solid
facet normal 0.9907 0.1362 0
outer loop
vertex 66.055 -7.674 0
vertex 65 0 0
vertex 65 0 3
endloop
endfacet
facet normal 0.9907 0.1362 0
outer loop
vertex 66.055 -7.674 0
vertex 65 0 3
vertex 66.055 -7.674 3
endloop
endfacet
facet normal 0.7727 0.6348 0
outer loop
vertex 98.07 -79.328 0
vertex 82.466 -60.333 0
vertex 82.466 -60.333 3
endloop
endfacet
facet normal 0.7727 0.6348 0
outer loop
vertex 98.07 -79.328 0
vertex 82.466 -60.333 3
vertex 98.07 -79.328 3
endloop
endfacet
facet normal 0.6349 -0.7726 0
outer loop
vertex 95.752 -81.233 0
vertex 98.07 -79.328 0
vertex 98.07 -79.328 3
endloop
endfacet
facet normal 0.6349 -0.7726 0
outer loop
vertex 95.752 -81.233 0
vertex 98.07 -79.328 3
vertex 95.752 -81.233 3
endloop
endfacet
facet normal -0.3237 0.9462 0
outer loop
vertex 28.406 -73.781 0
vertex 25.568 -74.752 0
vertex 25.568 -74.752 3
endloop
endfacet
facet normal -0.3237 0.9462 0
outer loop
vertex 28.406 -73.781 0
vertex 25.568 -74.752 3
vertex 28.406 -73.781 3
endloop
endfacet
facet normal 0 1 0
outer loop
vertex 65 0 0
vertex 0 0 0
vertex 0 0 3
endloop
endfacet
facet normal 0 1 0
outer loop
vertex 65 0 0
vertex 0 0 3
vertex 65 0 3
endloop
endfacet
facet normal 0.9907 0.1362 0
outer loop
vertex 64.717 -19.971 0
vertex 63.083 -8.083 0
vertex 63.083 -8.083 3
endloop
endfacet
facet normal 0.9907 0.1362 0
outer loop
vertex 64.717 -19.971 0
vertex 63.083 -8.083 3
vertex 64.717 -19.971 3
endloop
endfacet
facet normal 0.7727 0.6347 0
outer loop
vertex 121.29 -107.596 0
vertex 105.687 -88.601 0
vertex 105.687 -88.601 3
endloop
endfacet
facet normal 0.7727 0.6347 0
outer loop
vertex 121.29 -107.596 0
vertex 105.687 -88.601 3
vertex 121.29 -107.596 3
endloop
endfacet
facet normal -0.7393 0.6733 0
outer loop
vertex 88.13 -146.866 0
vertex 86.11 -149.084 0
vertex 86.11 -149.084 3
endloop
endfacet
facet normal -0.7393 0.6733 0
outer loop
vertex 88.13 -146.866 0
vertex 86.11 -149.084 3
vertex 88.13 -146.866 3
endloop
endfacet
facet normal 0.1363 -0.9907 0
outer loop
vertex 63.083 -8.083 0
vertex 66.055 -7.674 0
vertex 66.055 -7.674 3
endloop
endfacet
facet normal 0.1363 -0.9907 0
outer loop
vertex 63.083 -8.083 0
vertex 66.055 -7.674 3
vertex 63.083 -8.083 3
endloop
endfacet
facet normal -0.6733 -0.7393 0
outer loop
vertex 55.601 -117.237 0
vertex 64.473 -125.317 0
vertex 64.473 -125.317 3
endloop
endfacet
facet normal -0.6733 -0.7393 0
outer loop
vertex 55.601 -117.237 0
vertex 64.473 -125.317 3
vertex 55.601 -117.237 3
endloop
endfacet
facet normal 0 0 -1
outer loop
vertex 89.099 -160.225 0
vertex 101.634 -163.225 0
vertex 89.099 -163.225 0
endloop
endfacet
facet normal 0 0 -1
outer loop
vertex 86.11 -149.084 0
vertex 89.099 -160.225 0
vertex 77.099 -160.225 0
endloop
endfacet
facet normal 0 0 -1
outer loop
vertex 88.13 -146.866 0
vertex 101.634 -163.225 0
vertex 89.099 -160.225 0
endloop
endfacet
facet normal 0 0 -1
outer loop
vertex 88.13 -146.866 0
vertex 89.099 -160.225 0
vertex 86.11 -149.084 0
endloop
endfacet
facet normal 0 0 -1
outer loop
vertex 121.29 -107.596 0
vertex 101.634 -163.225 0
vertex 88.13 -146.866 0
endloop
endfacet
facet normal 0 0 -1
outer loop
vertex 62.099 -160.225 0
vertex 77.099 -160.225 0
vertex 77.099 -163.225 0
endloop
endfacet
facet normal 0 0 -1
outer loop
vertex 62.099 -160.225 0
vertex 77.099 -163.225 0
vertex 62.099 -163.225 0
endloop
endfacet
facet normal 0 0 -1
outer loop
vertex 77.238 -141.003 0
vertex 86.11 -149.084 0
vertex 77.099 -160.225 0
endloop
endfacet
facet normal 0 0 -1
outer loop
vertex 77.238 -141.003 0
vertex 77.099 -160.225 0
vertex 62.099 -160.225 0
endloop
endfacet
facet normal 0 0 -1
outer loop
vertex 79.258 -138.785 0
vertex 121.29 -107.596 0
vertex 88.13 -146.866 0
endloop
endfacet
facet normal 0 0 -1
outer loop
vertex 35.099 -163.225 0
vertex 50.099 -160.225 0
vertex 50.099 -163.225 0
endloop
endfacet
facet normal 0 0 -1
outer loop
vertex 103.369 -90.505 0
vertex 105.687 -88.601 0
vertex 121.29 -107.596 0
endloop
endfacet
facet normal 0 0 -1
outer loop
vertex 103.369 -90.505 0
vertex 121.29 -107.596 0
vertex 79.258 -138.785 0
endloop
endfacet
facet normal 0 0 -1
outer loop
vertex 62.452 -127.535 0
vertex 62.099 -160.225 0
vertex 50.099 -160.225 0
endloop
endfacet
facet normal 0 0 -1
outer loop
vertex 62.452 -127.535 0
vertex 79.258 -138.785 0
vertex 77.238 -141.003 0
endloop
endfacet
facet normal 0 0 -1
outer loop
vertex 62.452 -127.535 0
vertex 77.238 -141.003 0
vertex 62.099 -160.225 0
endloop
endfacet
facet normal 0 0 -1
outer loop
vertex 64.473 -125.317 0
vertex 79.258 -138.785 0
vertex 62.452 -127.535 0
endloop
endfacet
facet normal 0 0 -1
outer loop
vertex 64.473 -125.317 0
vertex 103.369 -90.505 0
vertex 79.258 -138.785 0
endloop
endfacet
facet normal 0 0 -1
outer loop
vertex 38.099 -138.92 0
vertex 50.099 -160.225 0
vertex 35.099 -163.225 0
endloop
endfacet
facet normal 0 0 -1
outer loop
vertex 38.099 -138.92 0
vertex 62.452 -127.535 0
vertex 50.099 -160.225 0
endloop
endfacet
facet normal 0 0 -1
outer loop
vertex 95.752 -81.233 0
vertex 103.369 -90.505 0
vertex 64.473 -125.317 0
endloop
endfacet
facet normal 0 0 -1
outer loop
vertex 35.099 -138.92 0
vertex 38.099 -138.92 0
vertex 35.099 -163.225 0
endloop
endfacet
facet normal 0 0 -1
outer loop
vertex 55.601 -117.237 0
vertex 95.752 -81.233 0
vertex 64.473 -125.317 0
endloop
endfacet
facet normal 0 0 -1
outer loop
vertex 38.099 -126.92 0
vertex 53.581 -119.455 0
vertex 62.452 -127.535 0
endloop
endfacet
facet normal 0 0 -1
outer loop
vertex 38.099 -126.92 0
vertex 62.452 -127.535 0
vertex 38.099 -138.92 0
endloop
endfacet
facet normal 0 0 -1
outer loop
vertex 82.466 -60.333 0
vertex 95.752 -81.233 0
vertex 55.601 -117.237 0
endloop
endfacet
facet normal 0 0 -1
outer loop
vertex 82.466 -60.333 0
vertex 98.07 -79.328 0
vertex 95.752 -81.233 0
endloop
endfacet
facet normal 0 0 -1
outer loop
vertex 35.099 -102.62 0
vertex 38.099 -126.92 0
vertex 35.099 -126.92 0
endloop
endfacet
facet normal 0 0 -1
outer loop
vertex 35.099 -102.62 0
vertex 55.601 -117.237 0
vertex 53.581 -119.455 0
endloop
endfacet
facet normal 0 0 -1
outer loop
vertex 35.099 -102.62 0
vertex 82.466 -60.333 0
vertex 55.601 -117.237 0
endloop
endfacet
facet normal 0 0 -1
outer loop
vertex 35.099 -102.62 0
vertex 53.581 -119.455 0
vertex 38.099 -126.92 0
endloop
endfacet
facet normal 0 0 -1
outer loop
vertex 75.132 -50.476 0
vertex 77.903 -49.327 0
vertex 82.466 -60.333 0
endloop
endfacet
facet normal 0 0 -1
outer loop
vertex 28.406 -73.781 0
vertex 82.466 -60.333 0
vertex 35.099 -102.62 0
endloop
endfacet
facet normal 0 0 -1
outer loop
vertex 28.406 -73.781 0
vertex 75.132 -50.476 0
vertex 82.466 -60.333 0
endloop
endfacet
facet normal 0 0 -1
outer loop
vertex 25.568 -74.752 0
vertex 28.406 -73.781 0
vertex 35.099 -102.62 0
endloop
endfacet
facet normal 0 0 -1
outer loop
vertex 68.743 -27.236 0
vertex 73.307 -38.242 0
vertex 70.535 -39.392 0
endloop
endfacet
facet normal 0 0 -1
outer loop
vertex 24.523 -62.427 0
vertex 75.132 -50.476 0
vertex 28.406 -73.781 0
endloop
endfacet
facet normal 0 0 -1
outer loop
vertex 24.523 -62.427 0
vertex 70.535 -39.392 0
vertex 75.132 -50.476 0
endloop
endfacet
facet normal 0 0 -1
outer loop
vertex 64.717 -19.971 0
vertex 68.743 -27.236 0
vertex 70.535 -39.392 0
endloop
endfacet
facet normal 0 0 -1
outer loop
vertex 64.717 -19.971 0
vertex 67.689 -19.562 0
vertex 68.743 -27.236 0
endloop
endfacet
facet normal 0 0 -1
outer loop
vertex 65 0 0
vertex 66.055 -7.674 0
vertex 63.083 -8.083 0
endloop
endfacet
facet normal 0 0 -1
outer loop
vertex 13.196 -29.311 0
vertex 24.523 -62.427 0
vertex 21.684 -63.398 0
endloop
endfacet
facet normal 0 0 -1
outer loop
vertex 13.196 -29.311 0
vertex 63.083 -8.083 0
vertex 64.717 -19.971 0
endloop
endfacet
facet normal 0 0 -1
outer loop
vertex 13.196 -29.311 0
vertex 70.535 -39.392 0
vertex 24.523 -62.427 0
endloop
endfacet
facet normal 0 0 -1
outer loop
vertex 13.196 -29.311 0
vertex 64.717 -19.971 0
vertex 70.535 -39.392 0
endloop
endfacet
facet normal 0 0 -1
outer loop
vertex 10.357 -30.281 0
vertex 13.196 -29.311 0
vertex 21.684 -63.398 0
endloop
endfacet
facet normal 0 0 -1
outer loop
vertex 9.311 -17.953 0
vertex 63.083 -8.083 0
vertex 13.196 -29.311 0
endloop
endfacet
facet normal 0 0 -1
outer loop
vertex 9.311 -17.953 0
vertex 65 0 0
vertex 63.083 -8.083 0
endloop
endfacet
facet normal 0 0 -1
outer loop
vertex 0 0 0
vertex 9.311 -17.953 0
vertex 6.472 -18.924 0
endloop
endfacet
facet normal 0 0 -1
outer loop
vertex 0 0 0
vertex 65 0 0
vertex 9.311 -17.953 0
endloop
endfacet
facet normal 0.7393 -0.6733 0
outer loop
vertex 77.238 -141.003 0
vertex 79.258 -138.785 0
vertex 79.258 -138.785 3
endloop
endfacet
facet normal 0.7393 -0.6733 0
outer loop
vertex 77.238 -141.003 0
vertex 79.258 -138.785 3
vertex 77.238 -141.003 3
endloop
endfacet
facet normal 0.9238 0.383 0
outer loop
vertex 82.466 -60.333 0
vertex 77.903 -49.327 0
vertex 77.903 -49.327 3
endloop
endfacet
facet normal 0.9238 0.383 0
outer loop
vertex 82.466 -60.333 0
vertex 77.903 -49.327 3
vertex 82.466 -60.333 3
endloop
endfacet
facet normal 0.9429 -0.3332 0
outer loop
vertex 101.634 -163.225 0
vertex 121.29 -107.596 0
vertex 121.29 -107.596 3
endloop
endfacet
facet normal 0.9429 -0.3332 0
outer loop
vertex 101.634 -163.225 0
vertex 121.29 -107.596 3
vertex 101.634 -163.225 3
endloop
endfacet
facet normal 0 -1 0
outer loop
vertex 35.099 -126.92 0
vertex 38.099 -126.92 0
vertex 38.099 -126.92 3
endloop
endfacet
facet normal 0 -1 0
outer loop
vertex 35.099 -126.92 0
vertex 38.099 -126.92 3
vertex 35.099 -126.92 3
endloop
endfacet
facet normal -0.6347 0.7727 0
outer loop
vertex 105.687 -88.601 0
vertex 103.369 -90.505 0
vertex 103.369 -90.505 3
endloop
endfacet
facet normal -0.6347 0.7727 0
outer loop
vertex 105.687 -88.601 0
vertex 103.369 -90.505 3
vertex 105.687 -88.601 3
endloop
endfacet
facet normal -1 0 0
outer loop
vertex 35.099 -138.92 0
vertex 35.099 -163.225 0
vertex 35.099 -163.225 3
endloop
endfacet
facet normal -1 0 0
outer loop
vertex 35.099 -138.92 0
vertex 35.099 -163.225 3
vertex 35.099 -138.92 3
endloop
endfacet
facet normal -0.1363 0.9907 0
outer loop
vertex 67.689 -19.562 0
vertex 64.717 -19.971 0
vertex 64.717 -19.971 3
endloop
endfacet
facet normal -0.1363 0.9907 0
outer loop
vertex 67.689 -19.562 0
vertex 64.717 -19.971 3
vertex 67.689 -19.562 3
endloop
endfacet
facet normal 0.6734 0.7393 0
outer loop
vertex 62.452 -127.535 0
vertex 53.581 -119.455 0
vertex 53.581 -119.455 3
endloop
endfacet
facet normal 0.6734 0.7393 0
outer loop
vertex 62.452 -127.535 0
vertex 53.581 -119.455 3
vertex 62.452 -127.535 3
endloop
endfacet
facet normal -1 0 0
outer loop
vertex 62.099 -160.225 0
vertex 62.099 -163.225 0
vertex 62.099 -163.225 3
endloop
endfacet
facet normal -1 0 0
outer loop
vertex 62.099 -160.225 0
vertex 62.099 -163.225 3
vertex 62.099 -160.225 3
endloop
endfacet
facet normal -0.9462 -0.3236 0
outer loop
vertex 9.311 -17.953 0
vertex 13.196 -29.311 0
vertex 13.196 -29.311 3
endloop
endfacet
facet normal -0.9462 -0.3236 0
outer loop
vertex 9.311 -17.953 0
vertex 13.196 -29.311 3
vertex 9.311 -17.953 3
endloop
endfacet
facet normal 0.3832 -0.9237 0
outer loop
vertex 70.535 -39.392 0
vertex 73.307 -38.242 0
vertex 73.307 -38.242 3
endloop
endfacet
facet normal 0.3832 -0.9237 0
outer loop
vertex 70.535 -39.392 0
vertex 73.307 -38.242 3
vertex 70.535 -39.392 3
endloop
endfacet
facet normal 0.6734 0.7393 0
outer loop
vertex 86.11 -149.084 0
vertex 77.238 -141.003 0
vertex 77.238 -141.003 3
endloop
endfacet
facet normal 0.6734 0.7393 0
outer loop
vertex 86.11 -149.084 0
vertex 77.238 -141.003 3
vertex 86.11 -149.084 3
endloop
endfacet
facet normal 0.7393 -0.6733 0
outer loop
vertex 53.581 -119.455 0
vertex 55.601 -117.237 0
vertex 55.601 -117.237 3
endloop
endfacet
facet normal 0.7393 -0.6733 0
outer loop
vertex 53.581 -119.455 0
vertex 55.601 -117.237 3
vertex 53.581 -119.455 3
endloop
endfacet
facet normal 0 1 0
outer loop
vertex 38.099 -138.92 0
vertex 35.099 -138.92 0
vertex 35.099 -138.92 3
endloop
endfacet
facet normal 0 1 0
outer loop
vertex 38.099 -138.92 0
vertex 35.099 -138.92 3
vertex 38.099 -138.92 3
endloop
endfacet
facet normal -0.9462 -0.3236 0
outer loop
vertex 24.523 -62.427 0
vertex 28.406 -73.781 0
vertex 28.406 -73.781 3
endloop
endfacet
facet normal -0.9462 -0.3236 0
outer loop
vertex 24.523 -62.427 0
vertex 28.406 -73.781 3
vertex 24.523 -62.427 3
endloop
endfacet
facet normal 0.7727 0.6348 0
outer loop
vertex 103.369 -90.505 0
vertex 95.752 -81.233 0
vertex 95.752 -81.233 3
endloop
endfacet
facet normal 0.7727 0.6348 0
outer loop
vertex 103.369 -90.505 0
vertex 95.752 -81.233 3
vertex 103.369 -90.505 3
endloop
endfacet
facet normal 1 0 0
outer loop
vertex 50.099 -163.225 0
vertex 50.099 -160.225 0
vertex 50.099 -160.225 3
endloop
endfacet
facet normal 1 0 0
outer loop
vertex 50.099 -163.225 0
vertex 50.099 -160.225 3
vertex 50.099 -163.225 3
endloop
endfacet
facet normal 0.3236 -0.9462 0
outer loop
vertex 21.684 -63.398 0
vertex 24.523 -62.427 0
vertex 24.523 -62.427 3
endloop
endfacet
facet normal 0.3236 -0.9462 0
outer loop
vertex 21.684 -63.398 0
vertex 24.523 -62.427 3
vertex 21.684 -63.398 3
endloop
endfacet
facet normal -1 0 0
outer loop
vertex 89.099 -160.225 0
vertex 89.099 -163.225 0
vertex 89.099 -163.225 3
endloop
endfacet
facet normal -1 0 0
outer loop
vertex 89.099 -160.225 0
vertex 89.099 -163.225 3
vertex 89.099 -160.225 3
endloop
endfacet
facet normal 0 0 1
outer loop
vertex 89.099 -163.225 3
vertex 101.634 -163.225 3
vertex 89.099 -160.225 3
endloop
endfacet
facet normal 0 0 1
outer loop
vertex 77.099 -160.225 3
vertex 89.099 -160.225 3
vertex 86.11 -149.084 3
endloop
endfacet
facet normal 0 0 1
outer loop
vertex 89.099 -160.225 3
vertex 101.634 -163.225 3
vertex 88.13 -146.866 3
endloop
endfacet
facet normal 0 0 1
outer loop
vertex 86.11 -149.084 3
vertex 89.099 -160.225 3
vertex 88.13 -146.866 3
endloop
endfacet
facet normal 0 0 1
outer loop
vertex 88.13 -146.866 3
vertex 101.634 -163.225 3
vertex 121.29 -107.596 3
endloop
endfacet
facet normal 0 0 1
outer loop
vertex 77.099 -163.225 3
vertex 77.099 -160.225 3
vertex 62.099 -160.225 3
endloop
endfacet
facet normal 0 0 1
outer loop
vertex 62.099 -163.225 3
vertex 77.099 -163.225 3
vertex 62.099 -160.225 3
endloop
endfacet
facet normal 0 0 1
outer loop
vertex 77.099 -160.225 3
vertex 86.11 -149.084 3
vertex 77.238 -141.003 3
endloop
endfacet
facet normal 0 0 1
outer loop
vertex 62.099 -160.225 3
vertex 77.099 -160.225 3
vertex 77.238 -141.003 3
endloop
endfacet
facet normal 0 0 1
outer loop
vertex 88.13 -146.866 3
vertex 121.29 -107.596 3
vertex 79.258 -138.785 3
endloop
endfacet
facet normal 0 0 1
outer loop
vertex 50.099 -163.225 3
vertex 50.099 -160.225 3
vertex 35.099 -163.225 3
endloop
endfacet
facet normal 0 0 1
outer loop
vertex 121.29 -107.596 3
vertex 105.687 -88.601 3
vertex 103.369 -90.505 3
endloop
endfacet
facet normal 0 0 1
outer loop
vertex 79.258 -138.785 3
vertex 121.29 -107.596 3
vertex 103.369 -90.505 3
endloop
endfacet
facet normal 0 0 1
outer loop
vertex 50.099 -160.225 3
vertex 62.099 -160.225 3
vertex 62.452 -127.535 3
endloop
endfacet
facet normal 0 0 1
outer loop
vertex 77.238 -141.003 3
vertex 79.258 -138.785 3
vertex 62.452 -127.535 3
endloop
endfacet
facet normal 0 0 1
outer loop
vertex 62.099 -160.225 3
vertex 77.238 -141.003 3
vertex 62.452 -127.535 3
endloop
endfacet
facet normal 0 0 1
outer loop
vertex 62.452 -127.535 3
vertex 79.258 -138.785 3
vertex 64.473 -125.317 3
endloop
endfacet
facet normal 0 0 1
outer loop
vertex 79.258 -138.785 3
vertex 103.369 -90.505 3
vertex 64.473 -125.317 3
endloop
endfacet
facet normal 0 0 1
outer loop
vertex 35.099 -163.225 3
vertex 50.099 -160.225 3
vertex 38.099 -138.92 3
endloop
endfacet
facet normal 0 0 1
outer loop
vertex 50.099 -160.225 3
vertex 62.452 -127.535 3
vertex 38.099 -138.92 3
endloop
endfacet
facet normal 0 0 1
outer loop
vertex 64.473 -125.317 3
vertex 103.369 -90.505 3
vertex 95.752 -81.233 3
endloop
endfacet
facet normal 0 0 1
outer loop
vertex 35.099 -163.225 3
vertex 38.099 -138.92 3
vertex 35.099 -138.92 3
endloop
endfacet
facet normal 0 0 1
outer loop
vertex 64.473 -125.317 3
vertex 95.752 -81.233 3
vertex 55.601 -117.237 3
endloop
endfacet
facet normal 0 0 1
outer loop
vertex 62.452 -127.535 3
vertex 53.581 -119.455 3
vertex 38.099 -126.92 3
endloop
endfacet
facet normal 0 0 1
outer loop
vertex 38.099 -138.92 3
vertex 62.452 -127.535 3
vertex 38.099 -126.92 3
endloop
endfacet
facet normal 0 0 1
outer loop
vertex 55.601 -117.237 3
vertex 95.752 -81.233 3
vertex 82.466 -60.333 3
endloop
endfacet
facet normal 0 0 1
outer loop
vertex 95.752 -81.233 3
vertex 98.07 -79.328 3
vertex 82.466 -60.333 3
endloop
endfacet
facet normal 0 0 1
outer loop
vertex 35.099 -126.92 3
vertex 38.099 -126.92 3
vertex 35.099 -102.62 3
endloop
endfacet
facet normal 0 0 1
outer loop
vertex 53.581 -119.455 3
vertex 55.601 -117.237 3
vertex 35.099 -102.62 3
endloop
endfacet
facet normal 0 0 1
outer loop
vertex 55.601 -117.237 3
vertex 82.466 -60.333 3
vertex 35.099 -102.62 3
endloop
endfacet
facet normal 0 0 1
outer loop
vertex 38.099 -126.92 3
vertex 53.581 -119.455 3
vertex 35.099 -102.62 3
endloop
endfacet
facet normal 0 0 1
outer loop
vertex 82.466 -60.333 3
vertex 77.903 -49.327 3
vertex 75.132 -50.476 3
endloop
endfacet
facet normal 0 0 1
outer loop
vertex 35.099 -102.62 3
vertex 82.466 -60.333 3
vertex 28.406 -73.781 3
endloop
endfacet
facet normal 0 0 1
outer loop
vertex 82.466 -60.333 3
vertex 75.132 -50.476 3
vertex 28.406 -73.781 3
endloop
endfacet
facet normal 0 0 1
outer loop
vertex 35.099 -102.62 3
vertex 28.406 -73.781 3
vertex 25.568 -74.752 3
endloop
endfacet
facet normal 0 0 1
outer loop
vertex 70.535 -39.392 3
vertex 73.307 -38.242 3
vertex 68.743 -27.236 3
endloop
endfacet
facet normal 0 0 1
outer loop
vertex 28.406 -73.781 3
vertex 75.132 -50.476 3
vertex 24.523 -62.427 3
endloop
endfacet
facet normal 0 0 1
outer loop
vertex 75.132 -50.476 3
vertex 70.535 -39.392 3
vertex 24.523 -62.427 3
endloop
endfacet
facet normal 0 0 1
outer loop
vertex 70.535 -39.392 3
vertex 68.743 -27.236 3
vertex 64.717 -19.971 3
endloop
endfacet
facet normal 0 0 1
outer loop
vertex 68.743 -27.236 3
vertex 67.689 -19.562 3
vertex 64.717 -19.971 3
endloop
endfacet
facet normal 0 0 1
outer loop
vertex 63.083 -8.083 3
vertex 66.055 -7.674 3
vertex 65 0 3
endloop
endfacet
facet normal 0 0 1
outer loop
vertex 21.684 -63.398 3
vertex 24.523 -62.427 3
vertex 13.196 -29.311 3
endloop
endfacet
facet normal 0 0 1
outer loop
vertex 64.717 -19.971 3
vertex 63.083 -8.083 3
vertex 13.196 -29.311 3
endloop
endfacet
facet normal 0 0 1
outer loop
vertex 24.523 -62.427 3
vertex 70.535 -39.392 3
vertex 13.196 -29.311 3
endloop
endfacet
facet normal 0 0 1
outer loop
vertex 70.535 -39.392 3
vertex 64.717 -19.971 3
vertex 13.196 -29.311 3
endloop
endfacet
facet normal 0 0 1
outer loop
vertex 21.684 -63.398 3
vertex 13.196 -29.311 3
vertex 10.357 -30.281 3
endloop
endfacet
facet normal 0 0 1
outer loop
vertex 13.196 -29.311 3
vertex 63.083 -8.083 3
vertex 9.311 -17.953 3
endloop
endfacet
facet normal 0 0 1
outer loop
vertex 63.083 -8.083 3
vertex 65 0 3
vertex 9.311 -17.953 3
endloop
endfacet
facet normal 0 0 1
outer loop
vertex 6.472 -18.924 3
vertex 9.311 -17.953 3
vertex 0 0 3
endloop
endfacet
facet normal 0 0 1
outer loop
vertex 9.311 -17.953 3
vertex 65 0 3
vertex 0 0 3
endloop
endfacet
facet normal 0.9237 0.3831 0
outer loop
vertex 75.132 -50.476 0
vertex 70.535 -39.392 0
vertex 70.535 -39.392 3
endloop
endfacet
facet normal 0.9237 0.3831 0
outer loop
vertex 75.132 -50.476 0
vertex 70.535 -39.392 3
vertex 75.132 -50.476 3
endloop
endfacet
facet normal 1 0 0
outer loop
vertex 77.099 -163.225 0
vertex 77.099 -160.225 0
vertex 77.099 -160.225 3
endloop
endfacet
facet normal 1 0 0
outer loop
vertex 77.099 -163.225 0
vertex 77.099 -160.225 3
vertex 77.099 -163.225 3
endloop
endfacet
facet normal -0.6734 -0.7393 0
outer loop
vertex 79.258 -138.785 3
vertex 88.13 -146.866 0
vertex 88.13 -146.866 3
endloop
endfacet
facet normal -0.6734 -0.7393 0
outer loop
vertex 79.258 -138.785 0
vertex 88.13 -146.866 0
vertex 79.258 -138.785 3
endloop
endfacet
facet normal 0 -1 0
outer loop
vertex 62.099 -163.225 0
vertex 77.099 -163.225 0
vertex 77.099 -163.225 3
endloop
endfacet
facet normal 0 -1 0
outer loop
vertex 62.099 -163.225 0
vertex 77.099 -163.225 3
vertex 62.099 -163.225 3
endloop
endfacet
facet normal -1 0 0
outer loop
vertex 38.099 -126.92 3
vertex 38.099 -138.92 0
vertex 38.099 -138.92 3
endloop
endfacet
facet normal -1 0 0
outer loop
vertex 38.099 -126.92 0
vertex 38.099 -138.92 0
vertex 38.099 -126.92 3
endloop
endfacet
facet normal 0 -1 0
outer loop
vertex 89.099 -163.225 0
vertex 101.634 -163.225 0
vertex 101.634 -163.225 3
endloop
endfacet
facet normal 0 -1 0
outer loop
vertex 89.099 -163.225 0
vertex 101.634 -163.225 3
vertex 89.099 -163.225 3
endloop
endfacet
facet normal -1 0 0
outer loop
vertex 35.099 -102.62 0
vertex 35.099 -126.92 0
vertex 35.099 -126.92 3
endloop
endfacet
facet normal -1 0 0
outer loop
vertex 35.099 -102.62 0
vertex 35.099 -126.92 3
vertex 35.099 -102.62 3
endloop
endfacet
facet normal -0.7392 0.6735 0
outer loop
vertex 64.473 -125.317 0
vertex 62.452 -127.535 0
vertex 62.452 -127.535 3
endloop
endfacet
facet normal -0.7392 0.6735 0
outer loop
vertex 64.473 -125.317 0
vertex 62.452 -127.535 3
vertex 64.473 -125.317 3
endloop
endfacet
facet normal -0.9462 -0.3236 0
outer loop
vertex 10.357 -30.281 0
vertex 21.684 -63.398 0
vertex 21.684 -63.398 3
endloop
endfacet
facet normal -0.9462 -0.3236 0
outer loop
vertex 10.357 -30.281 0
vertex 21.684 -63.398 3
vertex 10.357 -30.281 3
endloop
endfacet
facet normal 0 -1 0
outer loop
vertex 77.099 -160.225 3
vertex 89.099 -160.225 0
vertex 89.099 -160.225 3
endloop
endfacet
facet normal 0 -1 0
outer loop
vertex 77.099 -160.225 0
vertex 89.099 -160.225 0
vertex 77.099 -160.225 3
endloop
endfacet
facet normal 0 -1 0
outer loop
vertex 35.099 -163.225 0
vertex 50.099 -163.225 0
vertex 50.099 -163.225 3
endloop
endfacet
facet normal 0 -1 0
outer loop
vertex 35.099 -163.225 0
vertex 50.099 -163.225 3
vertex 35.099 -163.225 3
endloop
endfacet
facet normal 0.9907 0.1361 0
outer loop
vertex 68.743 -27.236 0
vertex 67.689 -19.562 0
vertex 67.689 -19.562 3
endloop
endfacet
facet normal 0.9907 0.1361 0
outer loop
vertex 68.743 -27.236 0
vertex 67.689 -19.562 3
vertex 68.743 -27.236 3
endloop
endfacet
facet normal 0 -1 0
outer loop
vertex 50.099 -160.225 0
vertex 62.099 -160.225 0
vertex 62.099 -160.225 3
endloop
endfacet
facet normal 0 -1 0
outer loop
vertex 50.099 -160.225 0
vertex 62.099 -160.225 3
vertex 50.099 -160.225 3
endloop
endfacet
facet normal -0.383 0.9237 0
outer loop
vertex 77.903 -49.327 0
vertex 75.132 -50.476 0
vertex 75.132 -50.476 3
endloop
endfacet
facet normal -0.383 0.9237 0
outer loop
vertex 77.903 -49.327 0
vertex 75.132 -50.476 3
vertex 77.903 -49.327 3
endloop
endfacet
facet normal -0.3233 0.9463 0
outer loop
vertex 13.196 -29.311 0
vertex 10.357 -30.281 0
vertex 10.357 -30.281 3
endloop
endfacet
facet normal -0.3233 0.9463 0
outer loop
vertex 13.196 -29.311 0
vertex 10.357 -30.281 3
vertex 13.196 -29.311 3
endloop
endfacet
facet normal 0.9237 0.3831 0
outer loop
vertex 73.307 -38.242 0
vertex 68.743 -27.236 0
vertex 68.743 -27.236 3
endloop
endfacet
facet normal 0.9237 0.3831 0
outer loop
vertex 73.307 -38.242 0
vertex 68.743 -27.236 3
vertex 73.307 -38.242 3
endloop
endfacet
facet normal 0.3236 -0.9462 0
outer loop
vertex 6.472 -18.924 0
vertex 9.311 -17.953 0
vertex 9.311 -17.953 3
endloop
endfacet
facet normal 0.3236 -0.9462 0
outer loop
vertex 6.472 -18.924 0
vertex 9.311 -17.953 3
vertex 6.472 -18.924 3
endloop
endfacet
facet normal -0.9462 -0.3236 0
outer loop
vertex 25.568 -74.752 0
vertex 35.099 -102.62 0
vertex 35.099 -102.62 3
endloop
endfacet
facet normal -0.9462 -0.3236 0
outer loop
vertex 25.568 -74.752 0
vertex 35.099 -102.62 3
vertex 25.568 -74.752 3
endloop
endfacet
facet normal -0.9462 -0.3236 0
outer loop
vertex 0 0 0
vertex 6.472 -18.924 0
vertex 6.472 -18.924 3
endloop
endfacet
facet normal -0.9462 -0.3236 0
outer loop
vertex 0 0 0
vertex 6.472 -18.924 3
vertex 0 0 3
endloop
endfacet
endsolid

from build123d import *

# Parameters (mm, degrees)
P_IDAT_VYSUNUT_M1_DEPTH = 3


with BuildPart() as part:
    # Skica1 → Přidat vysunutím1 (new body)
    with BuildSketch(Plane.XY):
        Polygon((35.098999138, -102.619674243), (25.567500119, -74.752232196), (28.406057565, -73.781360615), (24.522571242, -62.427130832), (21.684013796, -63.398002412), (10.357178687, -30.281498877), (13.195736133, -29.310627296), (9.311034651, -17.952844725), (6.472477205, -18.923716306), (0, 0), (65, 0), (66.054709497, -7.67410463), (63.082647903, -8.082577246), (64.716538365, -19.970823625), (67.68859996, -19.562351009), (68.743309457, -27.236455639), (73.306691143, -38.242479423), (70.535456643, -39.391504813), (75.131558201, -50.476442813), (77.902792701, -49.327417423), (82.466174387, -60.333441207), (98.069771345, -79.328299093), (95.751633165, -81.232566768), (103.368703864, -90.505119489), (105.686842044, -88.600851814), (121.290439003, -107.5957097), (101.634461089, -163.225221043), (89.098999138, -163.225221043), (89.098999138, -160.225221043), (77.098999138, -160.225221043), (77.098999138, -163.225221043), (62.098999138, -163.225221043), (62.098999138, -160.225221043), (50.098999138, -160.225221043), (50.098999138, -163.225221043), (35.098999138, -163.225221043), (35.098999138, -138.920221043), (38.098999138, -138.920221043), (38.098999138, -126.920221043), (35.098999138, -126.920221043), align=None)
        Polygon((53.581071902, -119.454548354), (62.452466829, -127.535287927), (64.472651723, -125.317439195), (55.601256796, -117.236699622), align=None, mode=Mode.SUBTRACT)
        Polygon((77.238125041, -141.003187216), (86.109519967, -149.083926789), (88.129704861, -146.866078058), (79.258309934, -138.785338484), align=None, mode=Mode.SUBTRACT)
    extrude(amount=P_IDAT_VYSUNUT_M1_DEPTH)


solid = part.part
